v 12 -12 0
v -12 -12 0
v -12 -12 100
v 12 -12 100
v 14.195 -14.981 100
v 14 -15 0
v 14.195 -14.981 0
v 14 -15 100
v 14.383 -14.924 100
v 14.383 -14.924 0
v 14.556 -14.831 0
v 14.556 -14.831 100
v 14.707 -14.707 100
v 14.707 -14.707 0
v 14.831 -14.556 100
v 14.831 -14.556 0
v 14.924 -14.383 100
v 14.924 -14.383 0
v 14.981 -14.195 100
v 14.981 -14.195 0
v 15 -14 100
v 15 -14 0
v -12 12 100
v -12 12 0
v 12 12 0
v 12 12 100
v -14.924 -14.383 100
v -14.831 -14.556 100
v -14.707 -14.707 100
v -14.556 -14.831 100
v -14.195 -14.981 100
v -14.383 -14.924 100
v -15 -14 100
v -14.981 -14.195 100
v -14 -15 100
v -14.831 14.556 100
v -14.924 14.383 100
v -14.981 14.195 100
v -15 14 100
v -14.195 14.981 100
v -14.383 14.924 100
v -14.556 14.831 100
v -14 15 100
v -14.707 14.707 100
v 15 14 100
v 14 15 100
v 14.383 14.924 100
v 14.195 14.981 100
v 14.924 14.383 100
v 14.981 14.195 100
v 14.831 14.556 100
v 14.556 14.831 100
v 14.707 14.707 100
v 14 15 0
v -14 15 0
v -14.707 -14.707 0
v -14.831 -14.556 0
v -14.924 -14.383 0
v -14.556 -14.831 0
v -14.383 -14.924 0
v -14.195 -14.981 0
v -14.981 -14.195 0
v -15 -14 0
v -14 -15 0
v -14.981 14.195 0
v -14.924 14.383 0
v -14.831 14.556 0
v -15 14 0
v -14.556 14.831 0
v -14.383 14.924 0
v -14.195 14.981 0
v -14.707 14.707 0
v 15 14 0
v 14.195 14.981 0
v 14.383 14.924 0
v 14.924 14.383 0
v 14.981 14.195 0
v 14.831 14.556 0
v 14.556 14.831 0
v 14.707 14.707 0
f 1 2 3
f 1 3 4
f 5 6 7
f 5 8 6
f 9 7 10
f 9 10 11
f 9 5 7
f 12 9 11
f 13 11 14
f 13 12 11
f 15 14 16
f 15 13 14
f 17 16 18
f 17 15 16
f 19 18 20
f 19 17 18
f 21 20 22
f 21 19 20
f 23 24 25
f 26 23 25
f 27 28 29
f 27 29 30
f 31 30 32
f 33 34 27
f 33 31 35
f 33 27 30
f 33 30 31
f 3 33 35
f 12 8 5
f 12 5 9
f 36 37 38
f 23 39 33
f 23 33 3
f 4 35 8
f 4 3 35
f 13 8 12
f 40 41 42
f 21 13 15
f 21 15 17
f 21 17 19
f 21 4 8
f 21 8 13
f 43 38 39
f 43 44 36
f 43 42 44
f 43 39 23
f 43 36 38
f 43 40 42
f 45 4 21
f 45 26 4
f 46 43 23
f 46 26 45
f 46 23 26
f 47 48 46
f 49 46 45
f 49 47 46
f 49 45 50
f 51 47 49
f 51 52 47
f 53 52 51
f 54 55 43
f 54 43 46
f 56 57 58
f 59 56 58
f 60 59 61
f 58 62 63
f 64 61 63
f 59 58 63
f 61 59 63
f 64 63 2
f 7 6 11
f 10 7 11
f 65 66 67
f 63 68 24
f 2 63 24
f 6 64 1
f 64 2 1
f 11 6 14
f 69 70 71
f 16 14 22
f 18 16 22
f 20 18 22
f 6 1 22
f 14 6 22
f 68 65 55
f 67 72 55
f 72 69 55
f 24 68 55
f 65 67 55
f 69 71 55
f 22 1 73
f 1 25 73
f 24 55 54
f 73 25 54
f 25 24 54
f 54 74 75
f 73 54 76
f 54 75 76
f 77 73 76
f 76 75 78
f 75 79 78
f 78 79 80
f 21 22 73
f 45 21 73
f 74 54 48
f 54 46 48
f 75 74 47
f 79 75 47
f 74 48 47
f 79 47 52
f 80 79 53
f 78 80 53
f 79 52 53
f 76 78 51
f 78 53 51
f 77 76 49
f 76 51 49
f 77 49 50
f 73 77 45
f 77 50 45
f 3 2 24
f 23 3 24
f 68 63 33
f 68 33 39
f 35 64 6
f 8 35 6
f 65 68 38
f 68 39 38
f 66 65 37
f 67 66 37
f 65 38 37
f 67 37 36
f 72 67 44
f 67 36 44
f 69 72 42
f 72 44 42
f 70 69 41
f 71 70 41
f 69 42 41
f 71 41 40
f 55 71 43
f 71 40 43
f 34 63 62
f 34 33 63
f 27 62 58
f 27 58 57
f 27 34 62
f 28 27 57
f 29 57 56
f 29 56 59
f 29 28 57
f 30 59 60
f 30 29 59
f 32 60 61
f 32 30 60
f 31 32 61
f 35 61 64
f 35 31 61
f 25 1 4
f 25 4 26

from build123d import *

# Parameters (mm, degrees)
SKETCH_W   = 30
SKETCH_H   = 30
SKETCH_W_2 = 24
SKETCH_H_2 = 24
PAD_DEPTH  = 100
FILLET_R   = 1


with BuildPart() as part:
    # Sketch → Pad (new body)
    with BuildSketch(Plane.XY):
        Rectangle(SKETCH_W, SKETCH_H)
        Rectangle(SKETCH_W_2, SKETCH_H_2, mode=Mode.SUBTRACT)
    extrude(amount=PAD_DEPTH)

    # Fillet
    fillet_edges = [part.edges().sort_by_distance(p)[0] for p in [
        (15, -15, 50),
        (15, 15, 50),
        (-15, -15, 50),
        (-15, 15, 50),
    ]]
    fillet(fillet_edges, radius=FILLET_R)


solid = part.part
